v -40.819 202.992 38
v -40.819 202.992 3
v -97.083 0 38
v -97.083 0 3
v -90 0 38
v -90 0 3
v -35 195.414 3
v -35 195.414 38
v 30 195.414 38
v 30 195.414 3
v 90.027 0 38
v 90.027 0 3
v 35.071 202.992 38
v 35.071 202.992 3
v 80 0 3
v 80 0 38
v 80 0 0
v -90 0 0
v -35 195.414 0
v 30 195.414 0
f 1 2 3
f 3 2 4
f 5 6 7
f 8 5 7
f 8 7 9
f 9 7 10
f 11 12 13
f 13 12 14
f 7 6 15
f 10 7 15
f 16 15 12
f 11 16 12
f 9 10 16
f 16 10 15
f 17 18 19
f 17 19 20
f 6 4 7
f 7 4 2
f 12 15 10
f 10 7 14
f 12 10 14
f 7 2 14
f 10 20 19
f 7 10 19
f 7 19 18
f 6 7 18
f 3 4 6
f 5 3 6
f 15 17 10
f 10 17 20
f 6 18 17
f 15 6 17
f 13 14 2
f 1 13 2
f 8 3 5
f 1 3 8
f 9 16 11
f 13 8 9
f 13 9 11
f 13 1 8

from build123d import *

# Parameters (mm, degrees)
F1_DEPTH = 3
F3_DEPTH = 343
F5_DEPTH = 35


# Not quite as in the source:
# - an extrude ends at something that could not be found from the text; its depth is read off the source's solid


with BuildPart() as f1:
    # F0 (on Top) → F1 (new body)
    with BuildSketch(Plane.XY):
        Polygon((30, 195.4140751933), (-35, 195.4140751933), (-90, 0), (0, 0), (80, 0), align=None)
    extrude(amount=F1_DEPTH)

    # F2 (on Top) → F3 (cut, through all)
    with BuildSketch(Plane.XY):
        with BuildLine():
            ThreePointArc((0, 109.7888334103), (7.3847296102, 112.8476885693), (10.4435847692, 120.2324181795))
            ThreePointArc((10.4435847692, 120.2324181795), (-7.3847296102, 127.6171477897), (0, 109.7888334103))
        make_face()
    extrude(amount=-F3_DEPTH, mode=Mode.SUBTRACT)


with BuildPart() as f5:
    # F4 (on face) → F5 (new body)
    with BuildSketch(Plane.XY.offset(3)):
        Polygon((-40.8189669251, 202.9922008514), (-97.0825403929, 0), (-90, 0), (-35, 195.4140751933), (30, 195.4140751933), (80, 0), (90.0265499949, 0), (35.0714325905, 202.9922008514), align=None)
    extrude(amount=F5_DEPTH)


solid = Compound([f1.part, f5.part])
